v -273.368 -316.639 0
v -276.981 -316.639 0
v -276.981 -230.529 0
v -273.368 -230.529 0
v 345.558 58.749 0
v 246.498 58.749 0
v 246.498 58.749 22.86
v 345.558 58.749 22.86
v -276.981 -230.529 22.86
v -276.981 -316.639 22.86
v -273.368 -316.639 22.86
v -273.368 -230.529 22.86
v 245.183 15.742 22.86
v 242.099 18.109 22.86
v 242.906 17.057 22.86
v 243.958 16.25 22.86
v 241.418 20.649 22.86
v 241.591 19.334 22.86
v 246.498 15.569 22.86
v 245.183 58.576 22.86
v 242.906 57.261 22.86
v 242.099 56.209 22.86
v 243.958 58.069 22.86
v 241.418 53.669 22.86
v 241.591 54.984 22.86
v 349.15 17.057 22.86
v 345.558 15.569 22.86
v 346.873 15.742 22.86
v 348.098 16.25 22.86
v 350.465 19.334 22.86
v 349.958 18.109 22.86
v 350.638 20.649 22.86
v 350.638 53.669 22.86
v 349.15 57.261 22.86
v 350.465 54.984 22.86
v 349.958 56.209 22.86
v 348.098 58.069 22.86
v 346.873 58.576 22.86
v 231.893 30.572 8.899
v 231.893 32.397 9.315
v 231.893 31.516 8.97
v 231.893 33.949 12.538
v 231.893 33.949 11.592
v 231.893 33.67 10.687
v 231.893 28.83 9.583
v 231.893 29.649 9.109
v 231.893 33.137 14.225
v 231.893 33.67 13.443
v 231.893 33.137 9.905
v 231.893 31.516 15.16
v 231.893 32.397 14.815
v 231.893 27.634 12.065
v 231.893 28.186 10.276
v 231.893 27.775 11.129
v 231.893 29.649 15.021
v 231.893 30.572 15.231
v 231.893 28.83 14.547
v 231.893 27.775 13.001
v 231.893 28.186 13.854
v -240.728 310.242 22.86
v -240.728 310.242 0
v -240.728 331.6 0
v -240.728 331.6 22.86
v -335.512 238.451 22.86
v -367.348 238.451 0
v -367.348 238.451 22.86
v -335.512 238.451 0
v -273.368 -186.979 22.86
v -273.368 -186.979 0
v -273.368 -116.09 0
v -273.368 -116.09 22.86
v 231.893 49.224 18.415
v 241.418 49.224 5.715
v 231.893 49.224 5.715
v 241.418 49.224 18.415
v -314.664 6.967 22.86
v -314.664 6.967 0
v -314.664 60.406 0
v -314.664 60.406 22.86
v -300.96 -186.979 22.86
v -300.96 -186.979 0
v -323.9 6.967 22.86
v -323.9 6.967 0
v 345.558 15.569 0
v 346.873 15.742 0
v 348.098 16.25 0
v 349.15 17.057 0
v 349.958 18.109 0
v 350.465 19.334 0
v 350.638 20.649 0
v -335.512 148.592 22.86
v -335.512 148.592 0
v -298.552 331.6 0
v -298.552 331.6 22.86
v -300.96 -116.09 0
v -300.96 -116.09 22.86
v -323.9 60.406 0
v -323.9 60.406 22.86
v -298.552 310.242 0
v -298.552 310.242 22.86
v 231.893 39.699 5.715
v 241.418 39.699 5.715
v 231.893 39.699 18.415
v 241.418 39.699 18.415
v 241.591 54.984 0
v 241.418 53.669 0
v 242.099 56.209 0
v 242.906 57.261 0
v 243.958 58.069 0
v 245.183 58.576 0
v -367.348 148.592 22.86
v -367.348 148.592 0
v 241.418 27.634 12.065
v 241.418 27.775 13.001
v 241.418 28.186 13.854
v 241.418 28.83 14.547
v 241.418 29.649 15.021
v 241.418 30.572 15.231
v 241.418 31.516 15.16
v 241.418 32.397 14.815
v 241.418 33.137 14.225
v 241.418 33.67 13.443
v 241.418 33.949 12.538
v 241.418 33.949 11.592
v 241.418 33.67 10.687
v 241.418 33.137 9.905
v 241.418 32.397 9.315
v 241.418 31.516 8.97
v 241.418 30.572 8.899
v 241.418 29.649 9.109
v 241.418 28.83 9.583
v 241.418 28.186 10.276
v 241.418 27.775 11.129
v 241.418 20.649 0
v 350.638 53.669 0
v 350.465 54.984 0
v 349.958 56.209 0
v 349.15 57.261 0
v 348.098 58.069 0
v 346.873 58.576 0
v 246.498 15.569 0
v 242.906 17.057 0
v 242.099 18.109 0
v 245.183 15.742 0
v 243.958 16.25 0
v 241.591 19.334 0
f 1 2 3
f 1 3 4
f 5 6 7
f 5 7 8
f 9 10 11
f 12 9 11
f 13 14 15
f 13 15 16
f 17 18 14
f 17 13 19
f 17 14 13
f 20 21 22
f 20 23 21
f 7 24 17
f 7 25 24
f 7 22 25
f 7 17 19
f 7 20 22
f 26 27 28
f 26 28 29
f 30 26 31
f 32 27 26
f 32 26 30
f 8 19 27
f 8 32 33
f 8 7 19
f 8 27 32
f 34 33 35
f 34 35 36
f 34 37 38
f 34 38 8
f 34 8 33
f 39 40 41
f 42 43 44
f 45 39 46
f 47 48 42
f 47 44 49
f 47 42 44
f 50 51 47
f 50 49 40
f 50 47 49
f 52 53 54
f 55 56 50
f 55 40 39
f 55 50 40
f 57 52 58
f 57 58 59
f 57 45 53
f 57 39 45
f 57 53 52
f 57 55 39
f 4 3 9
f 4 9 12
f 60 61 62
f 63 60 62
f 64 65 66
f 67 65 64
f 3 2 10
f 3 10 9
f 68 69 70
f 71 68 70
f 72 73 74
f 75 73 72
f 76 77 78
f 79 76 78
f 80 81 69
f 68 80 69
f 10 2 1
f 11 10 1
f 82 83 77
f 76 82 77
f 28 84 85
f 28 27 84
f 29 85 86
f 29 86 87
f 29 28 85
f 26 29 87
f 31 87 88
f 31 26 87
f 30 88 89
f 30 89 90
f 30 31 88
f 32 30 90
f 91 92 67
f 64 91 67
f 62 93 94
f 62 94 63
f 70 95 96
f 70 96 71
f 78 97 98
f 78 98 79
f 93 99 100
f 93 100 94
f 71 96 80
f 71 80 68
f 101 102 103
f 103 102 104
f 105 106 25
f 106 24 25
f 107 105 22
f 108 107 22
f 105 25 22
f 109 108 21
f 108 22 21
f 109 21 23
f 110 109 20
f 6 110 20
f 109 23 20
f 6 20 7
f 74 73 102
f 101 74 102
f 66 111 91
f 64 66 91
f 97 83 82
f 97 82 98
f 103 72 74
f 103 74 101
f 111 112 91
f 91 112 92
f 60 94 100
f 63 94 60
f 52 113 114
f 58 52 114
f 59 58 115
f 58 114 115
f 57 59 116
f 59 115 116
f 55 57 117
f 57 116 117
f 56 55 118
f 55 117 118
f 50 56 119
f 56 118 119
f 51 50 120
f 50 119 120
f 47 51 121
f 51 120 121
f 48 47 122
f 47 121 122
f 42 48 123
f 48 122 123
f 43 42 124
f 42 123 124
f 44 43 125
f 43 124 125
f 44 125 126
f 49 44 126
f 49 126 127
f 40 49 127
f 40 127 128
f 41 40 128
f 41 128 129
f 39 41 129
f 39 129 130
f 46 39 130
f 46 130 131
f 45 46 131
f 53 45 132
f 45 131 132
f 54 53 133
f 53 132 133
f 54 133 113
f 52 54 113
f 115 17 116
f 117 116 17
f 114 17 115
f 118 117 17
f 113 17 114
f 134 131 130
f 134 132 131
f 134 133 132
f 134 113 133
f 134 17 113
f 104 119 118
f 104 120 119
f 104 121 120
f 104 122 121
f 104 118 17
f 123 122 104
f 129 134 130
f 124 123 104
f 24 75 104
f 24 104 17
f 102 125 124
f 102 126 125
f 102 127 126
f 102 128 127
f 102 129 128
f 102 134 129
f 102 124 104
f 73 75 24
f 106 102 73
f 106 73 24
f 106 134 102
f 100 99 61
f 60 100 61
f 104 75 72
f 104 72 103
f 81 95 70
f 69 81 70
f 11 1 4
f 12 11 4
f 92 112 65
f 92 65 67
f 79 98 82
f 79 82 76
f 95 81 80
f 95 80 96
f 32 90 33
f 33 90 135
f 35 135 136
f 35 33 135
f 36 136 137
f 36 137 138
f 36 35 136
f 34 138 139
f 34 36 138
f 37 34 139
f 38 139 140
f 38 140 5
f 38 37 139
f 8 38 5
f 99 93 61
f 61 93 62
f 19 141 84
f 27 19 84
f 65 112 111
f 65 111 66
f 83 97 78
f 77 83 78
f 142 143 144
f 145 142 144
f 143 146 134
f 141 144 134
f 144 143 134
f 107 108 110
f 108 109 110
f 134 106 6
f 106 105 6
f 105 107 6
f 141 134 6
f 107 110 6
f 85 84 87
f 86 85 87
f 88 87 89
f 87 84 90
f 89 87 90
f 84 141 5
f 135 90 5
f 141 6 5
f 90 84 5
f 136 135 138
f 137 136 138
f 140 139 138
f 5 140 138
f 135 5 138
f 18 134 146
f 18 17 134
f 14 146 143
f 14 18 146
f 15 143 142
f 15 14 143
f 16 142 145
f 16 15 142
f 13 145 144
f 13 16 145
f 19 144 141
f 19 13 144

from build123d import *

# Parameters (mm, degrees)
F0_W     = 3.613095
F0_H     = 86.109218
F0_W_2   = 27.591766
F0_H_2   = 70.88902
F0_W_3   = 9.235798
F0_H_3   = 53.438857
F0_W_4   = 31.835885
F0_H_4   = 89.859261
F0_W_5   = 57.824143
F0_H_5   = 21.358143
F0_W_6   = 109.22
F0_H_6   = 43.18
F1_DEPTH = 22.86
F2_R     = 5.08
F3_W     = 9.525
F3_H     = 12.7
F3_R     = 3.175
F4_DEPTH = 9.525


with BuildPart() as f1:
    # F0 (on Top) → F1 (new body)
    with BuildSketch(Plane.XY):
        with Locations((-275.174352, -273.584095)):
            Rectangle(F0_W, F0_H)
        with Locations((-287.163688, -151.534095)):
            Rectangle(F0_W_2, F0_H_2)
        with Locations((-319.2822, 33.686879)):
            Rectangle(F0_W_3, F0_H_3)
        with Locations((-351.429625, 193.521529)):
            Rectangle(F0_W_4, F0_H_4)
        with Locations((-269.639578, 320.920599)):
            Rectangle(F0_W_5, F0_H_5)
        with Locations((296.028173, 37.159165)):
            Rectangle(F0_W_6, F0_H_6)
    extrude(amount=F1_DEPTH)

    # F2
    f2_edges = [f1.edges().sort_by_distance(p)[0] for p in [
        (350.638173, 15.569165, 11.43),
        (350.638173, 58.749165, 11.43),
        (241.418173, 15.569165, 11.43),
        (241.418173, 58.749165, 11.43),
    ]]
    fillet(f2_edges, radius=F2_R)

    # F3 (on face) → F4 (join)
    with BuildSketch(Plane(origin=(241.418173, 0, 0), x_dir=(0, -1, 0), z_dir=(-1, 0, 0))):
        with Locations((-44.461665, 12.065)):
            Rectangle(F3_W, F3_H)
        with Locations((-30.809165, 12.065)):
            Circle(F3_R)
    extrude(amount=F4_DEPTH)


solid = f1.part
